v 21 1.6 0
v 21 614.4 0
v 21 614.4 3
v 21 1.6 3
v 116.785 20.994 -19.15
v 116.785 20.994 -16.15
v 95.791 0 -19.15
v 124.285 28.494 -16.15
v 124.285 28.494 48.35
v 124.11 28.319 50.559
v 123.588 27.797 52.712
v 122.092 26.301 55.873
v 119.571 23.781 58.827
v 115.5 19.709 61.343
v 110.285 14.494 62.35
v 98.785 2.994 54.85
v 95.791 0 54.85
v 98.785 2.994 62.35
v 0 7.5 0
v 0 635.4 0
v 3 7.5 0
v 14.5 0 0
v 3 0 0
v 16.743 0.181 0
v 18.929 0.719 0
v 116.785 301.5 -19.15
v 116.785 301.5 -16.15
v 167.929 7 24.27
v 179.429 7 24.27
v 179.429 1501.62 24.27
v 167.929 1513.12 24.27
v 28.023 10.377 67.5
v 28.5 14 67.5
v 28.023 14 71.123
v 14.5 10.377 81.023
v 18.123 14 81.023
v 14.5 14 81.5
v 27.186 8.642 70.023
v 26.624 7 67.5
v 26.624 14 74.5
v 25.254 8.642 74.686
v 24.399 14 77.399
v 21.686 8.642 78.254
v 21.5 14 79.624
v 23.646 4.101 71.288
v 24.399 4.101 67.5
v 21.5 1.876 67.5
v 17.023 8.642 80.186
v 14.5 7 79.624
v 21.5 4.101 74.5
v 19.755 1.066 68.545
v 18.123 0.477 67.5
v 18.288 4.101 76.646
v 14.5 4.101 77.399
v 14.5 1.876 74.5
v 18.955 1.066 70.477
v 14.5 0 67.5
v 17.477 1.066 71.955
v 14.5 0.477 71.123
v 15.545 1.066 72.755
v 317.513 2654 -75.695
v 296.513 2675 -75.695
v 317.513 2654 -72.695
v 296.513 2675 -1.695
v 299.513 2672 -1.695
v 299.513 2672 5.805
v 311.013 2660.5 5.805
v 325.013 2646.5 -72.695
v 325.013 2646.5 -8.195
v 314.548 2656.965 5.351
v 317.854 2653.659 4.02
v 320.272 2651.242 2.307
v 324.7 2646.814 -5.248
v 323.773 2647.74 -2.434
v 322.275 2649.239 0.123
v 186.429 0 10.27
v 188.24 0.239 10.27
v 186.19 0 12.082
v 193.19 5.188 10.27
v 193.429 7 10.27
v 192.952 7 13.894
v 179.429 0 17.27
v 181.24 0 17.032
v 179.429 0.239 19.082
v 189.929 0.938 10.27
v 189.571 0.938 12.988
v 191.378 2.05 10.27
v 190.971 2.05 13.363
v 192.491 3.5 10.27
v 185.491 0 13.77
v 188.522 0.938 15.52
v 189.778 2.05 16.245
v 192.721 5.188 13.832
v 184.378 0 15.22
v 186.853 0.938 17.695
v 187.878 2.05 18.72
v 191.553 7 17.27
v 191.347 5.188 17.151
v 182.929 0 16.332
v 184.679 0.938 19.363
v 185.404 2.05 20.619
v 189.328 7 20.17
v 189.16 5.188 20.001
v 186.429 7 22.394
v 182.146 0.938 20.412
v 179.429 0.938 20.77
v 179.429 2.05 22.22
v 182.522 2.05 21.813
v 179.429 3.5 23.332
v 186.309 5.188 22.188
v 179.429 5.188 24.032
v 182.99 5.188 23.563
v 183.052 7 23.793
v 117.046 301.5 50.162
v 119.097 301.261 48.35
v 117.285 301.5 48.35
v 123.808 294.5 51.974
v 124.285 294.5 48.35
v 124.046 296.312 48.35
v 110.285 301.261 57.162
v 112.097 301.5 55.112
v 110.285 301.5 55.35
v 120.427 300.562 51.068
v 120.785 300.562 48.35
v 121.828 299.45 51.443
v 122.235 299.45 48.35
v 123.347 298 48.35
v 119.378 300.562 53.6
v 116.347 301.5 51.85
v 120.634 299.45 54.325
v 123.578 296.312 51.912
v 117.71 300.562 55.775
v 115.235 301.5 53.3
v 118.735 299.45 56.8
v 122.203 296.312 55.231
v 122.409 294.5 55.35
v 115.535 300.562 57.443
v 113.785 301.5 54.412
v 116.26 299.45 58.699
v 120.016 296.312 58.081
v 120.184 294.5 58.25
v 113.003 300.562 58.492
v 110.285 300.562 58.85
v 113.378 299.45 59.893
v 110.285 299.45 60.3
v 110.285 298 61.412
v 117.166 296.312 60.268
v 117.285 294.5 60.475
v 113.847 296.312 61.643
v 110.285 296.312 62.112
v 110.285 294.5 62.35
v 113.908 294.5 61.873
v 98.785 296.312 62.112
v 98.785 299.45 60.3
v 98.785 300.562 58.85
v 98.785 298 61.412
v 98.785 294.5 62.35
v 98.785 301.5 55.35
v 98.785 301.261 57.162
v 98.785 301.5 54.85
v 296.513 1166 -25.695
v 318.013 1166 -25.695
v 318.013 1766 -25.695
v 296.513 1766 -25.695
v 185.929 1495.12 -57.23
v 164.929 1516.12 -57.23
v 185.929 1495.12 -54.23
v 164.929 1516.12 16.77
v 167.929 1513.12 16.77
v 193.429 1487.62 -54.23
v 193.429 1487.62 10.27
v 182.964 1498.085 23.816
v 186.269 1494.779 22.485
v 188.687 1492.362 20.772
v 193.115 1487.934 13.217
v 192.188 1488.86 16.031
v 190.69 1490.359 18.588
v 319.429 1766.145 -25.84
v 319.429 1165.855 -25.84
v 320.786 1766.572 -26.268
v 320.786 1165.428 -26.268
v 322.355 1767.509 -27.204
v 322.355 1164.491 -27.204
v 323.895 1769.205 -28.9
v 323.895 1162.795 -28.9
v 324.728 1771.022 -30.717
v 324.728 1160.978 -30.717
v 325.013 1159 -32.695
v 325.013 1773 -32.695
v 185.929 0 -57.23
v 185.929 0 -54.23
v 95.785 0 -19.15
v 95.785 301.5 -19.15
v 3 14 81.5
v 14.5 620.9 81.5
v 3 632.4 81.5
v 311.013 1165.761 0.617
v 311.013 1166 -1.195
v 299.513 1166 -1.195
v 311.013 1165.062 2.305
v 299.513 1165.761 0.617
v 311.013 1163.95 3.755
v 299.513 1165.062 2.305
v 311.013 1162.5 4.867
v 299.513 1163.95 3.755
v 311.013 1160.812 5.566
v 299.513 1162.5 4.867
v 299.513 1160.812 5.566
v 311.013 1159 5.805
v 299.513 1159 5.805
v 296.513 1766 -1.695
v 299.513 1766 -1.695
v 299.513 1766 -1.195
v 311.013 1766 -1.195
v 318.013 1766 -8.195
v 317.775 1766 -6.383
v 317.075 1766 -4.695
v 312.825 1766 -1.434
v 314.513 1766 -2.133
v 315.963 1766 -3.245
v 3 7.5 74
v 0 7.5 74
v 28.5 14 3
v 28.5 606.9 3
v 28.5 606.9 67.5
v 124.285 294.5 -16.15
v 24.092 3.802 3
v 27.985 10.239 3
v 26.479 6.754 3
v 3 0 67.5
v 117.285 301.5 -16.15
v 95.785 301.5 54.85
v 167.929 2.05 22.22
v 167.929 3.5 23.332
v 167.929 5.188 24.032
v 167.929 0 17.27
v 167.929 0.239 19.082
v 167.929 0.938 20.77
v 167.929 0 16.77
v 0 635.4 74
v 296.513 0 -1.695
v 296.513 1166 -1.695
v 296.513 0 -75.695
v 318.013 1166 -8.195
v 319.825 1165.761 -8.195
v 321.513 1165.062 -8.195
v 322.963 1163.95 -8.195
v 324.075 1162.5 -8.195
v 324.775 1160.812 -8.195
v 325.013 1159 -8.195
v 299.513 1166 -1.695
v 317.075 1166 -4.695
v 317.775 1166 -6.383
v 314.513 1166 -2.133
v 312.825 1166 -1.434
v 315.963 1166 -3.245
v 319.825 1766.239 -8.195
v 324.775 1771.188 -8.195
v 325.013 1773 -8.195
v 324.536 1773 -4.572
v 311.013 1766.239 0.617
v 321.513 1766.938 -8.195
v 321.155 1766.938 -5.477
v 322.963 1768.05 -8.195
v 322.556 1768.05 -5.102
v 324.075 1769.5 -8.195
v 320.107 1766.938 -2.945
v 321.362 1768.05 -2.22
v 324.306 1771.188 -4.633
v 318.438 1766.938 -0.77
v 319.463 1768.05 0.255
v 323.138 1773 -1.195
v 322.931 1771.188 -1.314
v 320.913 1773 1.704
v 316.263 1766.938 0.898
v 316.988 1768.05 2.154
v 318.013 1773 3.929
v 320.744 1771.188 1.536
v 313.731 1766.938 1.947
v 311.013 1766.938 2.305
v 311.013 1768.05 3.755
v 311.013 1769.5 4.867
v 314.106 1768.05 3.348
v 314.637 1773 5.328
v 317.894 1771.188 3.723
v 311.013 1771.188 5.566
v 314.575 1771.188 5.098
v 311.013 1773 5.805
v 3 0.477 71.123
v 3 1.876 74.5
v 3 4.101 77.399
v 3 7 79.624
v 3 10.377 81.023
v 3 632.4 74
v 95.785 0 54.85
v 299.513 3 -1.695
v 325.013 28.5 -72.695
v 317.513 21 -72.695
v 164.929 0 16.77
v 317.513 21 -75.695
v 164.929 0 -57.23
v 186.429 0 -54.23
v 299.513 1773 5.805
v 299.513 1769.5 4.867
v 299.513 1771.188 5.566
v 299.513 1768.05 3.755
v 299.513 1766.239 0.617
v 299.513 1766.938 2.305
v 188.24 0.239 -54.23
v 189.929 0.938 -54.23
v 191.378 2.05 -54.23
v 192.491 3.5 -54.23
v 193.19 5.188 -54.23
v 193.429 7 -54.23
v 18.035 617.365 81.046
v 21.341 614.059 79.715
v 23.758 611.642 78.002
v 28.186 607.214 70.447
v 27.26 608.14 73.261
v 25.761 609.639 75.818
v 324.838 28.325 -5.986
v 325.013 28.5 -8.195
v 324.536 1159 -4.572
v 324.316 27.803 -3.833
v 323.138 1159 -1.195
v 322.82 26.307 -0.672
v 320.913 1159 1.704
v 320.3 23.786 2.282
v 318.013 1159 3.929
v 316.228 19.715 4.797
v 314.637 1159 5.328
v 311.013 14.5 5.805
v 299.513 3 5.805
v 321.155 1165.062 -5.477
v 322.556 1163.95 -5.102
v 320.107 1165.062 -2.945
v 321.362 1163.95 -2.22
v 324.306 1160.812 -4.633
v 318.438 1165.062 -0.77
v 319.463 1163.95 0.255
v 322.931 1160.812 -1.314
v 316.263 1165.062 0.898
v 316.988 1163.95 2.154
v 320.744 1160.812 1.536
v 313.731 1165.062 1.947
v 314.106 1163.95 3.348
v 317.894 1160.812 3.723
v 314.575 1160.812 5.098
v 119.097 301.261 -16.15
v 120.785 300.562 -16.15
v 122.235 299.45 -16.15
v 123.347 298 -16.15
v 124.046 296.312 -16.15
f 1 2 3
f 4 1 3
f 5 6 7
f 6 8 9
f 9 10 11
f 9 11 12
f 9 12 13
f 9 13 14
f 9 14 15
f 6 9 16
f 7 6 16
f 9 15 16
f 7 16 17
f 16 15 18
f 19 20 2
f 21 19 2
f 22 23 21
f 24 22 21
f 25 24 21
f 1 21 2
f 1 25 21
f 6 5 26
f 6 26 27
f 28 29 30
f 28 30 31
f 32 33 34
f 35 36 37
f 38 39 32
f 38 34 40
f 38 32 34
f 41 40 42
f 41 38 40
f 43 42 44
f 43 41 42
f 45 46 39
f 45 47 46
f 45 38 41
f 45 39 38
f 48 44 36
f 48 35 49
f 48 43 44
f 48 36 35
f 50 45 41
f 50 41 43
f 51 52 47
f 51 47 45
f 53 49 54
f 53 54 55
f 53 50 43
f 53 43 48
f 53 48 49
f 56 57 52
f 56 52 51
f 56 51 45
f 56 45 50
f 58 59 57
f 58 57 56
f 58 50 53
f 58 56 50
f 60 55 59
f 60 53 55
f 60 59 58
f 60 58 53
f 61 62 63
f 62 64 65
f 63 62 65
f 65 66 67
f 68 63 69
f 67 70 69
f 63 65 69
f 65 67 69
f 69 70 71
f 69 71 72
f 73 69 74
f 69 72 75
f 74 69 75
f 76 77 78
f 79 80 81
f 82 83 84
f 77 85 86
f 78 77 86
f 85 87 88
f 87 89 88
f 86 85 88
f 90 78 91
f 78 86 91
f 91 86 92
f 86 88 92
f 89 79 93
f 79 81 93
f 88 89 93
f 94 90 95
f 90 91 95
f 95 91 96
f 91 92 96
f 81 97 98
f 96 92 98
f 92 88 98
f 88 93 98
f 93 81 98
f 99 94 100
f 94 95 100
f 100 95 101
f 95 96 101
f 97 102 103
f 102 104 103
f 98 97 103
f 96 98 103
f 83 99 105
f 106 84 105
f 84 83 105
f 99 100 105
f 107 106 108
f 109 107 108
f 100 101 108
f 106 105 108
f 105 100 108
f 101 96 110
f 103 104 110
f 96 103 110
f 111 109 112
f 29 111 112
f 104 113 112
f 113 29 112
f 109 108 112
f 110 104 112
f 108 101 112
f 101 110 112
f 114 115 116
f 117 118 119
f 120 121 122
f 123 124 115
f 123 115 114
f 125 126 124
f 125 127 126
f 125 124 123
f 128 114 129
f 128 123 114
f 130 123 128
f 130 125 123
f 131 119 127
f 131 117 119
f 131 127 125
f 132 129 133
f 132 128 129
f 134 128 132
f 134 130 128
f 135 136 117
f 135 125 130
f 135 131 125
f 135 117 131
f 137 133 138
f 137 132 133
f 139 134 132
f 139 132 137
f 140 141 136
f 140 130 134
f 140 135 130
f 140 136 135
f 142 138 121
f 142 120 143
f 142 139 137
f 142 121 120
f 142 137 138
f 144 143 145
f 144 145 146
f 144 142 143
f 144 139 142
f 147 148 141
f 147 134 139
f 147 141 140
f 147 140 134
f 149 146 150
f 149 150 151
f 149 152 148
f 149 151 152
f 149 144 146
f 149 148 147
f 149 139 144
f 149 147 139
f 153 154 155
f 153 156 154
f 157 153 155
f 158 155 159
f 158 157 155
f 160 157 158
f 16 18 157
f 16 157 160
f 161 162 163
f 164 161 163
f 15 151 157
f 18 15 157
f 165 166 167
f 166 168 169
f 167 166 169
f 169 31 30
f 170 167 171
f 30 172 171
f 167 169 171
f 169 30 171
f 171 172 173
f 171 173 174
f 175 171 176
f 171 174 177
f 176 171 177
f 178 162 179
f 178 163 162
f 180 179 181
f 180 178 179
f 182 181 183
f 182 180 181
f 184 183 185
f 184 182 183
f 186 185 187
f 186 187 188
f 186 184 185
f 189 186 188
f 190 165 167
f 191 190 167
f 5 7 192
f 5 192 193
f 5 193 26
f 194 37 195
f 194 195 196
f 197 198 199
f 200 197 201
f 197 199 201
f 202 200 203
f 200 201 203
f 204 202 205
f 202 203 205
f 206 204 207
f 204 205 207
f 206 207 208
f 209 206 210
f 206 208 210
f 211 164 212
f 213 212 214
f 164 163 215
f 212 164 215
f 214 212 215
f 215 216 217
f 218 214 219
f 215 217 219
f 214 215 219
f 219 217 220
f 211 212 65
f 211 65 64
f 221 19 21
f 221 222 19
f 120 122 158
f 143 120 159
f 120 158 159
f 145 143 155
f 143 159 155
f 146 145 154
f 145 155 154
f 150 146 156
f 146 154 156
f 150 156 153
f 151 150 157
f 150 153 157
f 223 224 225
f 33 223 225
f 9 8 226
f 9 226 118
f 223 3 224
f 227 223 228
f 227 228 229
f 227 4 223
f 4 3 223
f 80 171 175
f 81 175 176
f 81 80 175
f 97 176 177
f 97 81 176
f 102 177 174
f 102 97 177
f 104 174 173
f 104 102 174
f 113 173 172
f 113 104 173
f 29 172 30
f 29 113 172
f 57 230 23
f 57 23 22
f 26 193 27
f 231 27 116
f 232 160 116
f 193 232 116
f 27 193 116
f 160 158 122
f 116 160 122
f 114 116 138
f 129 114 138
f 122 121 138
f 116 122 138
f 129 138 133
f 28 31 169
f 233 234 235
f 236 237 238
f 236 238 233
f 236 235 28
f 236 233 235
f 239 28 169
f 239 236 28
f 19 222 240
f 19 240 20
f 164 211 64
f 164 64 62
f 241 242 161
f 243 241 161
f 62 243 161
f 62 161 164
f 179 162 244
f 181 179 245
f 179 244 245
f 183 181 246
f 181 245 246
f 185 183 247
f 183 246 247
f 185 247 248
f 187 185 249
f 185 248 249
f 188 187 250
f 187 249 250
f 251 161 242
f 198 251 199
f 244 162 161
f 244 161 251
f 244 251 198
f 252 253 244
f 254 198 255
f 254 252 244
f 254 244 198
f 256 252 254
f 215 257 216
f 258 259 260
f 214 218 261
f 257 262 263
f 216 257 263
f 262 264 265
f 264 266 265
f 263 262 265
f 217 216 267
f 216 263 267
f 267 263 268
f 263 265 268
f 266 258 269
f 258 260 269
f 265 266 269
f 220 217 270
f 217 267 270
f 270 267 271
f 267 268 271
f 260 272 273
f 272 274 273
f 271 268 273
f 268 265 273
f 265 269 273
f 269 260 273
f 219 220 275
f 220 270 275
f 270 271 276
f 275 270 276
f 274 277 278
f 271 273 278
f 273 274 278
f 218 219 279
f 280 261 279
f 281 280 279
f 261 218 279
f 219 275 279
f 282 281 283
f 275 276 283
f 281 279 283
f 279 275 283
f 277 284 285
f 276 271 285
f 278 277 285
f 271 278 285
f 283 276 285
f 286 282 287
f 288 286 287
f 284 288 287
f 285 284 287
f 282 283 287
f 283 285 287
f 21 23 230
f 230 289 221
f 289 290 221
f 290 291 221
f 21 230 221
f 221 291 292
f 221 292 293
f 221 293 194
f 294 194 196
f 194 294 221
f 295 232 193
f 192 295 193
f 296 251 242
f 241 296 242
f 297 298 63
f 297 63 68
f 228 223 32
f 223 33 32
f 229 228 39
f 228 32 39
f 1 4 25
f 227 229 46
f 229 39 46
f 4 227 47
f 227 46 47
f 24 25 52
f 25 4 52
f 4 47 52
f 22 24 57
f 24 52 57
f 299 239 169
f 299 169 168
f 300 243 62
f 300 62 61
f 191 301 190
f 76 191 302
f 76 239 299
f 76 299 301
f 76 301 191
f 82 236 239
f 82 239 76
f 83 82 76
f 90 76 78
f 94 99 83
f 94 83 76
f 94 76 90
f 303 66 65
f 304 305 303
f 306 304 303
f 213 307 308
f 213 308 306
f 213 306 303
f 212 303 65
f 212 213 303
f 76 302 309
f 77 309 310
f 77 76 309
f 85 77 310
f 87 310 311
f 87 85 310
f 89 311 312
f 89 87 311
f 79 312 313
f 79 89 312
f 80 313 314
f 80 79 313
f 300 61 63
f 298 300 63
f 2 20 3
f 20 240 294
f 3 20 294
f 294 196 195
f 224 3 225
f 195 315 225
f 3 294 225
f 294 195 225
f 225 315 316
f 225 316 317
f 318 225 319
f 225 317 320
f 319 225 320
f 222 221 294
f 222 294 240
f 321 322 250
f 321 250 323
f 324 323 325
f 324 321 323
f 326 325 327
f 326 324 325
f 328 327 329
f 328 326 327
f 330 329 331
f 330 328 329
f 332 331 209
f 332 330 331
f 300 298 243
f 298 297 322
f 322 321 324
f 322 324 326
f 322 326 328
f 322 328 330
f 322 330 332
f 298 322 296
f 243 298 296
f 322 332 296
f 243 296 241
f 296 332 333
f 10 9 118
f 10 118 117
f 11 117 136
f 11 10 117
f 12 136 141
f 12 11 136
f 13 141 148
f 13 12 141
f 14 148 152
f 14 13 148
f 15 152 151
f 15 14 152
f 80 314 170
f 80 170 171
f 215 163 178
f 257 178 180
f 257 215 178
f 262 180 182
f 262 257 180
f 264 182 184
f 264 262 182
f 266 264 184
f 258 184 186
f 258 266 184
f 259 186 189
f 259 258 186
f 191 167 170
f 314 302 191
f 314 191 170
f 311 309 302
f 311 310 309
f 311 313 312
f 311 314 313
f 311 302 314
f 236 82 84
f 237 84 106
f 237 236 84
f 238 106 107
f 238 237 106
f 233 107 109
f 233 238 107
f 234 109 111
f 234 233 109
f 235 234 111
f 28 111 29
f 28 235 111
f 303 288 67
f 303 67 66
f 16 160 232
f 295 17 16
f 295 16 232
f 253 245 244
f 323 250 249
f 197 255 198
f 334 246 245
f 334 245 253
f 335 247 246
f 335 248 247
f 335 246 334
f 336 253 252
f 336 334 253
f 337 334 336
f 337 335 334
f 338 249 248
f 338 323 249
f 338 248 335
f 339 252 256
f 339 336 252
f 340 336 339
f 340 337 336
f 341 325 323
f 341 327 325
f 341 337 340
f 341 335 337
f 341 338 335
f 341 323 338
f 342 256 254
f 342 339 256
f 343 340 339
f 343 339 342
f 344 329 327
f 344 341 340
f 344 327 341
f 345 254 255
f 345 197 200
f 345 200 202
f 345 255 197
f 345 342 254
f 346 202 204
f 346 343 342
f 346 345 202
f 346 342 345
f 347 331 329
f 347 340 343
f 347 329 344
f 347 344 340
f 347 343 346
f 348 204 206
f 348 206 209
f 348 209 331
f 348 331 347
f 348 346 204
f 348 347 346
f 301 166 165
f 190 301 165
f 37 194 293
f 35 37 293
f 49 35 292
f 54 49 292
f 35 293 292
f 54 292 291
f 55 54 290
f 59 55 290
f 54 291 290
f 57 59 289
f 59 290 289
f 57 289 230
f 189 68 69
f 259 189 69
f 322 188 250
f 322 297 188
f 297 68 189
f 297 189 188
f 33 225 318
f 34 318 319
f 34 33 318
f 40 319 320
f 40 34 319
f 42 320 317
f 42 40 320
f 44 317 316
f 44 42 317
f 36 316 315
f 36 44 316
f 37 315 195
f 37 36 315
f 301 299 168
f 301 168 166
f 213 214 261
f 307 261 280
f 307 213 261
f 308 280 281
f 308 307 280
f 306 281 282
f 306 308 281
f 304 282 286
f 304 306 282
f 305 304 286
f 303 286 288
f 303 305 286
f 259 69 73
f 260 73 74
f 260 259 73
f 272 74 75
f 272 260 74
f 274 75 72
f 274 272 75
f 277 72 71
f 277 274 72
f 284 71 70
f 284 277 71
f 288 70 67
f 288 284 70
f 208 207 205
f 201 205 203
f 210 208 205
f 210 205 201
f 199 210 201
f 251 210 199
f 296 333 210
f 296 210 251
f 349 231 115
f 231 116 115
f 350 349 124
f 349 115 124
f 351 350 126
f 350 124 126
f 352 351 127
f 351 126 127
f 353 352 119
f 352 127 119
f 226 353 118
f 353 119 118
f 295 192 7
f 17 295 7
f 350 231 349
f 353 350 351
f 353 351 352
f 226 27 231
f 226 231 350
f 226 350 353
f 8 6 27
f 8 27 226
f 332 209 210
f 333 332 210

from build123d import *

# Parameters (mm, degrees)
F1_DEPTH  = 635.4
F2_R      = 14
F3_W      = 11.7114912719
F3_H      = 15.8868902363
F4_DEPTH  = 81.501
F6_DEPTH  = 301.5
F8_DEPTH  = 81.501
F9_R      = 7
F11_DEPTH = 1516.12
F13_DEPTH = 81.501
F14_R     = 7
F16_DEPTH = 2675
F18_DEPTH = 81.501
F19_W     = 600
F19_H     = 102.8366100552
F20_DEPTH = 325.014245344
F21_R     = 7


with BuildPart() as f1:
    # F0 (on Front) → F1 (new body)
    with BuildSketch(Plane.XZ):
        with BuildLine():
            Line((0, 74), (0, 0))
            Line((0, 0), (21, 0))
            Line((21, 0), (21, 3))
            Line((21, 3), (28.5, 3))
            Line((28.5, 3), (28.5, 67.5))
            ThreePointArc((28.5, 67.5), (24.3994949366, 77.3994949366), (14.5, 81.5))
            Line((14.5, 81.5), (3, 81.5))
            Line((3, 81.5), (3, 74))
            Line((3, 74), (0, 74))
        make_face()
    extrude(amount=-F1_DEPTH)

    # F2
    f2_edges = [f1.edges().sort_by_distance(p)[0] for p in [
        (8.75, 0, 81.5),
    ]]
    fillet(f2_edges, radius=F2_R)

    # F3 (on face) → F4 (cut, through all)
    with BuildSketch(Plane.XY.offset(81.5)):
        Polygon((32.8396826832, 635.8946625846), (0, 635.4), (32.8396826832, 602.5603173168), align=None)
        with Locations((-2.8557456359, -0.4434451181)):
            Rectangle(F3_W, F3_H)
    extrude(amount=-F4_DEPTH, mode=Mode.SUBTRACT)


with BuildPart() as f6:
    # F5 (on Front) → F6 (new body)
    with BuildSketch(Plane.XZ):
        with BuildLine():
            Line((95.7850002645, 54.8502280084), (95.7850002645, -19.1497719916))
            Line((95.7850002645, -19.1497719916), (116.7850002645, -19.1497719916))
            Line((116.7850002645, -19.1497719916), (116.7850002645, -16.1497719916))
            Line((116.7850002645, -16.1497719916), (124.2850002645, -16.1497719916))
            Line((124.2850002645, -16.1497719916), (124.2850002645, 48.3502280084))
            ThreePointArc((124.2850002645, 48.3502280084), (120.1844952011, 58.249722945), (110.2850002645, 62.3502280084))
            Line((110.2850002645, 62.3502280084), (98.7850002645, 62.3502280084))
            Line((98.7850002645, 62.3502280084), (98.7850002645, 54.8502280084))
            Line((98.7850002645, 54.8502280084), (95.7850002645, 54.8502280084))
        make_face()
    extrude(amount=-F6_DEPTH)

    # F7 (on face) → F8 (cut, through all)
    with BuildSketch(Plane.XY.offset(62.3502280084)):
        Polygon((128.0828008649, 32.2921613452), (95.7906395197, 0), (128.0828008649, -11.502165139), align=None)
    extrude(amount=-F8_DEPTH, mode=Mode.SUBTRACT)

    # F9
    f9_edges = [f6.edges().sort_by_distance(p)[0] for p in [
        (124.285, 301.5, 16.100228),
    ]]
    fillet(f9_edges, radius=F9_R)


with BuildPart() as f11:
    # F10 (on Front) → F11 (new body)
    with BuildSketch(Plane.XZ):
        with BuildLine():
            Line((164.928750038, 16.7700600518), (164.928750038, -57.2299399482))
            Line((164.928750038, -57.2299399482), (185.928750038, -57.2299399482))
            Line((185.928750038, -57.2299399482), (185.928750038, -54.2299399482))
            Line((185.928750038, -54.2299399482), (193.428750038, -54.2299399482))
            Line((193.428750038, -54.2299399482), (193.428750038, 10.2700600518))
            ThreePointArc((193.428750038, 10.2700600518), (189.3282449746, 20.1695549884), (179.428750038, 24.2700600518))
            Line((179.428750038, 24.2700600518), (167.928750038, 24.2700600518))
            Line((167.928750038, 24.2700600518), (167.928750038, 16.7700600518))
            Line((167.928750038, 16.7700600518), (164.928750038, 16.7700600518))
        make_face()
    extrude(amount=-F11_DEPTH)

    # F12 (on face) → F13 (cut, through all)
    with BuildSketch(Plane.XY.offset(24.2700600518)):
        Polygon((222.393949924, 1522.9550638974), (164.928750038, 1516.12), (222.393949924, 1458.6548001139), align=None)
    extrude(amount=-F13_DEPTH, mode=Mode.SUBTRACT)

    # F14
    f14_edges = [f11.edges().sort_by_distance(p)[0] for p in [
        (173.67875, 0, 24.27006),
    ]]
    fillet(f14_edges, radius=F14_R)


with BuildPart() as f16:
    # F15 (on Front) → F16 (new body)
    with BuildSketch(Plane.XZ):
        with BuildLine():
            Line((296.513245344, -1.6950537743), (296.513245344, -75.6950537743))
            Line((296.513245344, -75.6950537743), (317.513245344, -75.6950537743))
            Line((317.513245344, -75.6950537743), (317.513245344, -72.6950537743))
            Line((317.513245344, -72.6950537743), (325.013245344, -72.6950537743))
            Line((325.013245344, -72.6950537743), (325.013245344, -8.1950537743))
            ThreePointArc((325.013245344, -8.1950537743), (320.9127402806, 1.7044411623), (311.013245344, 5.8049462257))
            Line((311.013245344, 5.8049462257), (299.513245344, 5.8049462257))
            Line((299.513245344, 5.8049462257), (299.513245344, -1.6950537743))
            Line((299.513245344, -1.6950537743), (296.513245344, -1.6950537743))
        make_face()
    extrude(amount=-F16_DEPTH)

    # F17 (on face) → F18 (cut, through all)
    with BuildSketch(Plane.XY.offset(5.8049462257)):
        Polygon((325.3486404543, 28.8353951103), (296.513245344, 0), (328.7430405617, -5.8557791635), align=None)
        Polygon((329.7191858292, 2681.4970970154), (296.513245344, 2675), (329.9051460379, 2641.6080993061), align=None)
    extrude(amount=-F18_DEPTH, mode=Mode.SUBTRACT)

    # F19 (on face) → F20 (cut, through all)
    with BuildSketch(Plane.YZ.offset(325.013245344)):
        with Locations((1466, 25.7232512533)):
            Rectangle(F19_W, F19_H)
    extrude(amount=-F20_DEPTH, mode=Mode.SUBTRACT)

    # F21
    f21_edges = [f16.edges().sort_by_distance(p)[0] for p in [
        (305.263245, 1166, 5.804946),
        (325.013245, 1466, -25.695054),
        (305.263245, 1766, 5.804946),
    ]]
    fillet(f21_edges, radius=F21_R)


solid = Compound([f1.part, f6.part, f11.part, f16.part])
